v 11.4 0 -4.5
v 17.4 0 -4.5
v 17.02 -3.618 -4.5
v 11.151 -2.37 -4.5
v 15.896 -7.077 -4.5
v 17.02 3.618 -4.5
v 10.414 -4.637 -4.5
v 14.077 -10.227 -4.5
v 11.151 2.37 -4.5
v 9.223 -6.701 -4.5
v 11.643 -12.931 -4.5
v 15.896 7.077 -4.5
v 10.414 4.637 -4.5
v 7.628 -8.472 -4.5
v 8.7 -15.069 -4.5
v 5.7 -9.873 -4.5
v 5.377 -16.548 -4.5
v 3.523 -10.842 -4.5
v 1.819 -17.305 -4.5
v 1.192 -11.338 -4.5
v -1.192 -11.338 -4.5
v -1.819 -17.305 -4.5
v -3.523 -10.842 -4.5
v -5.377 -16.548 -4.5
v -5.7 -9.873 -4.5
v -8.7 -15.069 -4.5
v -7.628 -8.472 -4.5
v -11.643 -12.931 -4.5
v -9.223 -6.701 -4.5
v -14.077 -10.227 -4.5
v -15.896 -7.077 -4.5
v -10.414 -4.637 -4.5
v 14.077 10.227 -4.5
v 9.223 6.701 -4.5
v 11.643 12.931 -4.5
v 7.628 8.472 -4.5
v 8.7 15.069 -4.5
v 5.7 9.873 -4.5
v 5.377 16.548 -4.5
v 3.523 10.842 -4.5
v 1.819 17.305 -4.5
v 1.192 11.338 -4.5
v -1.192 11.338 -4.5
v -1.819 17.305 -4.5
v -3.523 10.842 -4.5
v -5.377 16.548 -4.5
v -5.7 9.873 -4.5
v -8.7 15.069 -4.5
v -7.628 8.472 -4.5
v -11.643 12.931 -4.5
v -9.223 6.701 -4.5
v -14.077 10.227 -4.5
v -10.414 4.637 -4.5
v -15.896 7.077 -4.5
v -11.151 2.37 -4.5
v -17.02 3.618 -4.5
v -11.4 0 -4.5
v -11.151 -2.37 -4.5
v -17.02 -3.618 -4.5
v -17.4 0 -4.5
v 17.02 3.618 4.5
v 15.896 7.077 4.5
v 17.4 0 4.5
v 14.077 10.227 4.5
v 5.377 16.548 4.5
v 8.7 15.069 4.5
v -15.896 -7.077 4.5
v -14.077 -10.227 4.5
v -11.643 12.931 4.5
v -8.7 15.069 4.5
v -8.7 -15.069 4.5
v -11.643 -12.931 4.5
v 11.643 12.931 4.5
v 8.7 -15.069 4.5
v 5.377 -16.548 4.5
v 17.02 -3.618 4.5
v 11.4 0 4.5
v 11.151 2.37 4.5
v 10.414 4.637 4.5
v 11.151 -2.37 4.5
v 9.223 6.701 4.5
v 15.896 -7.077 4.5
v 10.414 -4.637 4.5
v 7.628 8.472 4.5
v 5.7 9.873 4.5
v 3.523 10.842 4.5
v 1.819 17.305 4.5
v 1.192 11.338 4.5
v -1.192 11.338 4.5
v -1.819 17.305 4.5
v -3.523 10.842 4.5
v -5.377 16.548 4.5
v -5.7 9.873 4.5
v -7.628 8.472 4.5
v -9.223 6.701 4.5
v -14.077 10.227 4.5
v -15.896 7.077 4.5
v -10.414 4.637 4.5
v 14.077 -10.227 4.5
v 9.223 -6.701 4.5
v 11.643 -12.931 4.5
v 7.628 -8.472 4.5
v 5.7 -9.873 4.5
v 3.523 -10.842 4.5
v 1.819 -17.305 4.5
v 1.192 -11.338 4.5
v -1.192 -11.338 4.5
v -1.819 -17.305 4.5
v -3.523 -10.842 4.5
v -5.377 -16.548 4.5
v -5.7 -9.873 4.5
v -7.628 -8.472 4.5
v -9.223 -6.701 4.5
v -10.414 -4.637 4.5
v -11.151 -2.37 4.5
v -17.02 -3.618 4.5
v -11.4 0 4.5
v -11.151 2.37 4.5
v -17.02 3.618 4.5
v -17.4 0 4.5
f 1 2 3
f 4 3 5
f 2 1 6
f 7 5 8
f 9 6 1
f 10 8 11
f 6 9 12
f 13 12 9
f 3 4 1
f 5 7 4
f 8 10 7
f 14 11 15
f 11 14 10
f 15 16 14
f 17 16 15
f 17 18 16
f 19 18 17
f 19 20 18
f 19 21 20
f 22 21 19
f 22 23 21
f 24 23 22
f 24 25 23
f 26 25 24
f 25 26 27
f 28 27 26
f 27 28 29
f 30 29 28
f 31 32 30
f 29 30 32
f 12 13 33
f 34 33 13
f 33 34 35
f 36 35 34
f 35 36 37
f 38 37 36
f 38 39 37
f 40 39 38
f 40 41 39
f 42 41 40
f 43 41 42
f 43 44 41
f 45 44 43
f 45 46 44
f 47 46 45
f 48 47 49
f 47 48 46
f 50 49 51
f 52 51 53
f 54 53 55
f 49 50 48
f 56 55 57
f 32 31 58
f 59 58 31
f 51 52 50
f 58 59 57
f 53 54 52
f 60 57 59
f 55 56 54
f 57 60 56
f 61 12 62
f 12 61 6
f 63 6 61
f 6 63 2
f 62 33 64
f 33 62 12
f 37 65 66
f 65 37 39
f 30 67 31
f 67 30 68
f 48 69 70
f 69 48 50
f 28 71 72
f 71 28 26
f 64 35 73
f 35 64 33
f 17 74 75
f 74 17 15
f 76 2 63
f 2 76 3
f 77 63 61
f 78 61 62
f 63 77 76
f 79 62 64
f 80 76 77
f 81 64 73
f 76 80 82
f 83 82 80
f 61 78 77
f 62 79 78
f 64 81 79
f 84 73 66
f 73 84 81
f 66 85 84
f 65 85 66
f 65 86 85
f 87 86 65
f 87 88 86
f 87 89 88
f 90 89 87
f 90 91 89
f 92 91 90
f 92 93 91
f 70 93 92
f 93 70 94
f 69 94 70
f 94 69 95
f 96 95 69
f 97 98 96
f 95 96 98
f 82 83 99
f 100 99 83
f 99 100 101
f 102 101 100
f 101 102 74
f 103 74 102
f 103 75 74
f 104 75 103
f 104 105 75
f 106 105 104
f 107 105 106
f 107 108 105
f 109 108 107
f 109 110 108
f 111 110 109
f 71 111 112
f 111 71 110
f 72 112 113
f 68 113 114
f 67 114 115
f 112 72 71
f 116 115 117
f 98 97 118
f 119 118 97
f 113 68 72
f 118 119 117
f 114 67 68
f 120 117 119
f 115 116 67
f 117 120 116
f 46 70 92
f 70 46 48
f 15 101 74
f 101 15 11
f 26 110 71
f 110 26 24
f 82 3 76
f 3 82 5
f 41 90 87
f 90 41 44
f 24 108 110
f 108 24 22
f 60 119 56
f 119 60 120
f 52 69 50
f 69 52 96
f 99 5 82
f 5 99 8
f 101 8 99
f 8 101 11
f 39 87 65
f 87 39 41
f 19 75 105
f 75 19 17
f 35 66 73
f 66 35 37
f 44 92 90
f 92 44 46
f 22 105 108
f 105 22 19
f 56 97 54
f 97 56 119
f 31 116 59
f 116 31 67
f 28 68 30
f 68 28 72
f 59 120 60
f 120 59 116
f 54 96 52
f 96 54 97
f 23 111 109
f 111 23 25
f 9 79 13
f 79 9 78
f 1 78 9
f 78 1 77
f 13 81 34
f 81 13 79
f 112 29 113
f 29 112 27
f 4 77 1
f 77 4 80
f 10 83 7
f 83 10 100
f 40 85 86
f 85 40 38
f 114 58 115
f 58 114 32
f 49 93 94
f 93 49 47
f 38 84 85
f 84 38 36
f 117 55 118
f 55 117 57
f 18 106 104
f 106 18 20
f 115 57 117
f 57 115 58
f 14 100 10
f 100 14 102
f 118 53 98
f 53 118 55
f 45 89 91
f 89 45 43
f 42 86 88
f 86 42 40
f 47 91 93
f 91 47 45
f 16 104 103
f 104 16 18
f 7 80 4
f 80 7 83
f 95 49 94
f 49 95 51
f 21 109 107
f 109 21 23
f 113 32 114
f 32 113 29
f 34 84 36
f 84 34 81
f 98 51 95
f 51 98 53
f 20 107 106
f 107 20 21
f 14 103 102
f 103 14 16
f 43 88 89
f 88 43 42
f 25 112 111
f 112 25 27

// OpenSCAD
// Parameters
outer_radius = 17.4; //[8.7:34.8:0.1]
inner_radius = 11.4; //[5.7:22.8:0.1]
height = 9; //[4.5:18:0.5]
wall_thickness = 0.5; //[0.25:1:0.05]
z_overlap = 1; //[0.5:2:0.1]

// Geometry
module radial_body_outer() {
  cylinder(h=height, r=outer_radius, center=true);
}

module radial_body_inner_cut() {
  cylinder(h=height + 2*z_overlap, r=inner_radius, center=true);
}

// Final Output
difference() {
  radial_body_outer();
  radial_body_inner_cut();
}
